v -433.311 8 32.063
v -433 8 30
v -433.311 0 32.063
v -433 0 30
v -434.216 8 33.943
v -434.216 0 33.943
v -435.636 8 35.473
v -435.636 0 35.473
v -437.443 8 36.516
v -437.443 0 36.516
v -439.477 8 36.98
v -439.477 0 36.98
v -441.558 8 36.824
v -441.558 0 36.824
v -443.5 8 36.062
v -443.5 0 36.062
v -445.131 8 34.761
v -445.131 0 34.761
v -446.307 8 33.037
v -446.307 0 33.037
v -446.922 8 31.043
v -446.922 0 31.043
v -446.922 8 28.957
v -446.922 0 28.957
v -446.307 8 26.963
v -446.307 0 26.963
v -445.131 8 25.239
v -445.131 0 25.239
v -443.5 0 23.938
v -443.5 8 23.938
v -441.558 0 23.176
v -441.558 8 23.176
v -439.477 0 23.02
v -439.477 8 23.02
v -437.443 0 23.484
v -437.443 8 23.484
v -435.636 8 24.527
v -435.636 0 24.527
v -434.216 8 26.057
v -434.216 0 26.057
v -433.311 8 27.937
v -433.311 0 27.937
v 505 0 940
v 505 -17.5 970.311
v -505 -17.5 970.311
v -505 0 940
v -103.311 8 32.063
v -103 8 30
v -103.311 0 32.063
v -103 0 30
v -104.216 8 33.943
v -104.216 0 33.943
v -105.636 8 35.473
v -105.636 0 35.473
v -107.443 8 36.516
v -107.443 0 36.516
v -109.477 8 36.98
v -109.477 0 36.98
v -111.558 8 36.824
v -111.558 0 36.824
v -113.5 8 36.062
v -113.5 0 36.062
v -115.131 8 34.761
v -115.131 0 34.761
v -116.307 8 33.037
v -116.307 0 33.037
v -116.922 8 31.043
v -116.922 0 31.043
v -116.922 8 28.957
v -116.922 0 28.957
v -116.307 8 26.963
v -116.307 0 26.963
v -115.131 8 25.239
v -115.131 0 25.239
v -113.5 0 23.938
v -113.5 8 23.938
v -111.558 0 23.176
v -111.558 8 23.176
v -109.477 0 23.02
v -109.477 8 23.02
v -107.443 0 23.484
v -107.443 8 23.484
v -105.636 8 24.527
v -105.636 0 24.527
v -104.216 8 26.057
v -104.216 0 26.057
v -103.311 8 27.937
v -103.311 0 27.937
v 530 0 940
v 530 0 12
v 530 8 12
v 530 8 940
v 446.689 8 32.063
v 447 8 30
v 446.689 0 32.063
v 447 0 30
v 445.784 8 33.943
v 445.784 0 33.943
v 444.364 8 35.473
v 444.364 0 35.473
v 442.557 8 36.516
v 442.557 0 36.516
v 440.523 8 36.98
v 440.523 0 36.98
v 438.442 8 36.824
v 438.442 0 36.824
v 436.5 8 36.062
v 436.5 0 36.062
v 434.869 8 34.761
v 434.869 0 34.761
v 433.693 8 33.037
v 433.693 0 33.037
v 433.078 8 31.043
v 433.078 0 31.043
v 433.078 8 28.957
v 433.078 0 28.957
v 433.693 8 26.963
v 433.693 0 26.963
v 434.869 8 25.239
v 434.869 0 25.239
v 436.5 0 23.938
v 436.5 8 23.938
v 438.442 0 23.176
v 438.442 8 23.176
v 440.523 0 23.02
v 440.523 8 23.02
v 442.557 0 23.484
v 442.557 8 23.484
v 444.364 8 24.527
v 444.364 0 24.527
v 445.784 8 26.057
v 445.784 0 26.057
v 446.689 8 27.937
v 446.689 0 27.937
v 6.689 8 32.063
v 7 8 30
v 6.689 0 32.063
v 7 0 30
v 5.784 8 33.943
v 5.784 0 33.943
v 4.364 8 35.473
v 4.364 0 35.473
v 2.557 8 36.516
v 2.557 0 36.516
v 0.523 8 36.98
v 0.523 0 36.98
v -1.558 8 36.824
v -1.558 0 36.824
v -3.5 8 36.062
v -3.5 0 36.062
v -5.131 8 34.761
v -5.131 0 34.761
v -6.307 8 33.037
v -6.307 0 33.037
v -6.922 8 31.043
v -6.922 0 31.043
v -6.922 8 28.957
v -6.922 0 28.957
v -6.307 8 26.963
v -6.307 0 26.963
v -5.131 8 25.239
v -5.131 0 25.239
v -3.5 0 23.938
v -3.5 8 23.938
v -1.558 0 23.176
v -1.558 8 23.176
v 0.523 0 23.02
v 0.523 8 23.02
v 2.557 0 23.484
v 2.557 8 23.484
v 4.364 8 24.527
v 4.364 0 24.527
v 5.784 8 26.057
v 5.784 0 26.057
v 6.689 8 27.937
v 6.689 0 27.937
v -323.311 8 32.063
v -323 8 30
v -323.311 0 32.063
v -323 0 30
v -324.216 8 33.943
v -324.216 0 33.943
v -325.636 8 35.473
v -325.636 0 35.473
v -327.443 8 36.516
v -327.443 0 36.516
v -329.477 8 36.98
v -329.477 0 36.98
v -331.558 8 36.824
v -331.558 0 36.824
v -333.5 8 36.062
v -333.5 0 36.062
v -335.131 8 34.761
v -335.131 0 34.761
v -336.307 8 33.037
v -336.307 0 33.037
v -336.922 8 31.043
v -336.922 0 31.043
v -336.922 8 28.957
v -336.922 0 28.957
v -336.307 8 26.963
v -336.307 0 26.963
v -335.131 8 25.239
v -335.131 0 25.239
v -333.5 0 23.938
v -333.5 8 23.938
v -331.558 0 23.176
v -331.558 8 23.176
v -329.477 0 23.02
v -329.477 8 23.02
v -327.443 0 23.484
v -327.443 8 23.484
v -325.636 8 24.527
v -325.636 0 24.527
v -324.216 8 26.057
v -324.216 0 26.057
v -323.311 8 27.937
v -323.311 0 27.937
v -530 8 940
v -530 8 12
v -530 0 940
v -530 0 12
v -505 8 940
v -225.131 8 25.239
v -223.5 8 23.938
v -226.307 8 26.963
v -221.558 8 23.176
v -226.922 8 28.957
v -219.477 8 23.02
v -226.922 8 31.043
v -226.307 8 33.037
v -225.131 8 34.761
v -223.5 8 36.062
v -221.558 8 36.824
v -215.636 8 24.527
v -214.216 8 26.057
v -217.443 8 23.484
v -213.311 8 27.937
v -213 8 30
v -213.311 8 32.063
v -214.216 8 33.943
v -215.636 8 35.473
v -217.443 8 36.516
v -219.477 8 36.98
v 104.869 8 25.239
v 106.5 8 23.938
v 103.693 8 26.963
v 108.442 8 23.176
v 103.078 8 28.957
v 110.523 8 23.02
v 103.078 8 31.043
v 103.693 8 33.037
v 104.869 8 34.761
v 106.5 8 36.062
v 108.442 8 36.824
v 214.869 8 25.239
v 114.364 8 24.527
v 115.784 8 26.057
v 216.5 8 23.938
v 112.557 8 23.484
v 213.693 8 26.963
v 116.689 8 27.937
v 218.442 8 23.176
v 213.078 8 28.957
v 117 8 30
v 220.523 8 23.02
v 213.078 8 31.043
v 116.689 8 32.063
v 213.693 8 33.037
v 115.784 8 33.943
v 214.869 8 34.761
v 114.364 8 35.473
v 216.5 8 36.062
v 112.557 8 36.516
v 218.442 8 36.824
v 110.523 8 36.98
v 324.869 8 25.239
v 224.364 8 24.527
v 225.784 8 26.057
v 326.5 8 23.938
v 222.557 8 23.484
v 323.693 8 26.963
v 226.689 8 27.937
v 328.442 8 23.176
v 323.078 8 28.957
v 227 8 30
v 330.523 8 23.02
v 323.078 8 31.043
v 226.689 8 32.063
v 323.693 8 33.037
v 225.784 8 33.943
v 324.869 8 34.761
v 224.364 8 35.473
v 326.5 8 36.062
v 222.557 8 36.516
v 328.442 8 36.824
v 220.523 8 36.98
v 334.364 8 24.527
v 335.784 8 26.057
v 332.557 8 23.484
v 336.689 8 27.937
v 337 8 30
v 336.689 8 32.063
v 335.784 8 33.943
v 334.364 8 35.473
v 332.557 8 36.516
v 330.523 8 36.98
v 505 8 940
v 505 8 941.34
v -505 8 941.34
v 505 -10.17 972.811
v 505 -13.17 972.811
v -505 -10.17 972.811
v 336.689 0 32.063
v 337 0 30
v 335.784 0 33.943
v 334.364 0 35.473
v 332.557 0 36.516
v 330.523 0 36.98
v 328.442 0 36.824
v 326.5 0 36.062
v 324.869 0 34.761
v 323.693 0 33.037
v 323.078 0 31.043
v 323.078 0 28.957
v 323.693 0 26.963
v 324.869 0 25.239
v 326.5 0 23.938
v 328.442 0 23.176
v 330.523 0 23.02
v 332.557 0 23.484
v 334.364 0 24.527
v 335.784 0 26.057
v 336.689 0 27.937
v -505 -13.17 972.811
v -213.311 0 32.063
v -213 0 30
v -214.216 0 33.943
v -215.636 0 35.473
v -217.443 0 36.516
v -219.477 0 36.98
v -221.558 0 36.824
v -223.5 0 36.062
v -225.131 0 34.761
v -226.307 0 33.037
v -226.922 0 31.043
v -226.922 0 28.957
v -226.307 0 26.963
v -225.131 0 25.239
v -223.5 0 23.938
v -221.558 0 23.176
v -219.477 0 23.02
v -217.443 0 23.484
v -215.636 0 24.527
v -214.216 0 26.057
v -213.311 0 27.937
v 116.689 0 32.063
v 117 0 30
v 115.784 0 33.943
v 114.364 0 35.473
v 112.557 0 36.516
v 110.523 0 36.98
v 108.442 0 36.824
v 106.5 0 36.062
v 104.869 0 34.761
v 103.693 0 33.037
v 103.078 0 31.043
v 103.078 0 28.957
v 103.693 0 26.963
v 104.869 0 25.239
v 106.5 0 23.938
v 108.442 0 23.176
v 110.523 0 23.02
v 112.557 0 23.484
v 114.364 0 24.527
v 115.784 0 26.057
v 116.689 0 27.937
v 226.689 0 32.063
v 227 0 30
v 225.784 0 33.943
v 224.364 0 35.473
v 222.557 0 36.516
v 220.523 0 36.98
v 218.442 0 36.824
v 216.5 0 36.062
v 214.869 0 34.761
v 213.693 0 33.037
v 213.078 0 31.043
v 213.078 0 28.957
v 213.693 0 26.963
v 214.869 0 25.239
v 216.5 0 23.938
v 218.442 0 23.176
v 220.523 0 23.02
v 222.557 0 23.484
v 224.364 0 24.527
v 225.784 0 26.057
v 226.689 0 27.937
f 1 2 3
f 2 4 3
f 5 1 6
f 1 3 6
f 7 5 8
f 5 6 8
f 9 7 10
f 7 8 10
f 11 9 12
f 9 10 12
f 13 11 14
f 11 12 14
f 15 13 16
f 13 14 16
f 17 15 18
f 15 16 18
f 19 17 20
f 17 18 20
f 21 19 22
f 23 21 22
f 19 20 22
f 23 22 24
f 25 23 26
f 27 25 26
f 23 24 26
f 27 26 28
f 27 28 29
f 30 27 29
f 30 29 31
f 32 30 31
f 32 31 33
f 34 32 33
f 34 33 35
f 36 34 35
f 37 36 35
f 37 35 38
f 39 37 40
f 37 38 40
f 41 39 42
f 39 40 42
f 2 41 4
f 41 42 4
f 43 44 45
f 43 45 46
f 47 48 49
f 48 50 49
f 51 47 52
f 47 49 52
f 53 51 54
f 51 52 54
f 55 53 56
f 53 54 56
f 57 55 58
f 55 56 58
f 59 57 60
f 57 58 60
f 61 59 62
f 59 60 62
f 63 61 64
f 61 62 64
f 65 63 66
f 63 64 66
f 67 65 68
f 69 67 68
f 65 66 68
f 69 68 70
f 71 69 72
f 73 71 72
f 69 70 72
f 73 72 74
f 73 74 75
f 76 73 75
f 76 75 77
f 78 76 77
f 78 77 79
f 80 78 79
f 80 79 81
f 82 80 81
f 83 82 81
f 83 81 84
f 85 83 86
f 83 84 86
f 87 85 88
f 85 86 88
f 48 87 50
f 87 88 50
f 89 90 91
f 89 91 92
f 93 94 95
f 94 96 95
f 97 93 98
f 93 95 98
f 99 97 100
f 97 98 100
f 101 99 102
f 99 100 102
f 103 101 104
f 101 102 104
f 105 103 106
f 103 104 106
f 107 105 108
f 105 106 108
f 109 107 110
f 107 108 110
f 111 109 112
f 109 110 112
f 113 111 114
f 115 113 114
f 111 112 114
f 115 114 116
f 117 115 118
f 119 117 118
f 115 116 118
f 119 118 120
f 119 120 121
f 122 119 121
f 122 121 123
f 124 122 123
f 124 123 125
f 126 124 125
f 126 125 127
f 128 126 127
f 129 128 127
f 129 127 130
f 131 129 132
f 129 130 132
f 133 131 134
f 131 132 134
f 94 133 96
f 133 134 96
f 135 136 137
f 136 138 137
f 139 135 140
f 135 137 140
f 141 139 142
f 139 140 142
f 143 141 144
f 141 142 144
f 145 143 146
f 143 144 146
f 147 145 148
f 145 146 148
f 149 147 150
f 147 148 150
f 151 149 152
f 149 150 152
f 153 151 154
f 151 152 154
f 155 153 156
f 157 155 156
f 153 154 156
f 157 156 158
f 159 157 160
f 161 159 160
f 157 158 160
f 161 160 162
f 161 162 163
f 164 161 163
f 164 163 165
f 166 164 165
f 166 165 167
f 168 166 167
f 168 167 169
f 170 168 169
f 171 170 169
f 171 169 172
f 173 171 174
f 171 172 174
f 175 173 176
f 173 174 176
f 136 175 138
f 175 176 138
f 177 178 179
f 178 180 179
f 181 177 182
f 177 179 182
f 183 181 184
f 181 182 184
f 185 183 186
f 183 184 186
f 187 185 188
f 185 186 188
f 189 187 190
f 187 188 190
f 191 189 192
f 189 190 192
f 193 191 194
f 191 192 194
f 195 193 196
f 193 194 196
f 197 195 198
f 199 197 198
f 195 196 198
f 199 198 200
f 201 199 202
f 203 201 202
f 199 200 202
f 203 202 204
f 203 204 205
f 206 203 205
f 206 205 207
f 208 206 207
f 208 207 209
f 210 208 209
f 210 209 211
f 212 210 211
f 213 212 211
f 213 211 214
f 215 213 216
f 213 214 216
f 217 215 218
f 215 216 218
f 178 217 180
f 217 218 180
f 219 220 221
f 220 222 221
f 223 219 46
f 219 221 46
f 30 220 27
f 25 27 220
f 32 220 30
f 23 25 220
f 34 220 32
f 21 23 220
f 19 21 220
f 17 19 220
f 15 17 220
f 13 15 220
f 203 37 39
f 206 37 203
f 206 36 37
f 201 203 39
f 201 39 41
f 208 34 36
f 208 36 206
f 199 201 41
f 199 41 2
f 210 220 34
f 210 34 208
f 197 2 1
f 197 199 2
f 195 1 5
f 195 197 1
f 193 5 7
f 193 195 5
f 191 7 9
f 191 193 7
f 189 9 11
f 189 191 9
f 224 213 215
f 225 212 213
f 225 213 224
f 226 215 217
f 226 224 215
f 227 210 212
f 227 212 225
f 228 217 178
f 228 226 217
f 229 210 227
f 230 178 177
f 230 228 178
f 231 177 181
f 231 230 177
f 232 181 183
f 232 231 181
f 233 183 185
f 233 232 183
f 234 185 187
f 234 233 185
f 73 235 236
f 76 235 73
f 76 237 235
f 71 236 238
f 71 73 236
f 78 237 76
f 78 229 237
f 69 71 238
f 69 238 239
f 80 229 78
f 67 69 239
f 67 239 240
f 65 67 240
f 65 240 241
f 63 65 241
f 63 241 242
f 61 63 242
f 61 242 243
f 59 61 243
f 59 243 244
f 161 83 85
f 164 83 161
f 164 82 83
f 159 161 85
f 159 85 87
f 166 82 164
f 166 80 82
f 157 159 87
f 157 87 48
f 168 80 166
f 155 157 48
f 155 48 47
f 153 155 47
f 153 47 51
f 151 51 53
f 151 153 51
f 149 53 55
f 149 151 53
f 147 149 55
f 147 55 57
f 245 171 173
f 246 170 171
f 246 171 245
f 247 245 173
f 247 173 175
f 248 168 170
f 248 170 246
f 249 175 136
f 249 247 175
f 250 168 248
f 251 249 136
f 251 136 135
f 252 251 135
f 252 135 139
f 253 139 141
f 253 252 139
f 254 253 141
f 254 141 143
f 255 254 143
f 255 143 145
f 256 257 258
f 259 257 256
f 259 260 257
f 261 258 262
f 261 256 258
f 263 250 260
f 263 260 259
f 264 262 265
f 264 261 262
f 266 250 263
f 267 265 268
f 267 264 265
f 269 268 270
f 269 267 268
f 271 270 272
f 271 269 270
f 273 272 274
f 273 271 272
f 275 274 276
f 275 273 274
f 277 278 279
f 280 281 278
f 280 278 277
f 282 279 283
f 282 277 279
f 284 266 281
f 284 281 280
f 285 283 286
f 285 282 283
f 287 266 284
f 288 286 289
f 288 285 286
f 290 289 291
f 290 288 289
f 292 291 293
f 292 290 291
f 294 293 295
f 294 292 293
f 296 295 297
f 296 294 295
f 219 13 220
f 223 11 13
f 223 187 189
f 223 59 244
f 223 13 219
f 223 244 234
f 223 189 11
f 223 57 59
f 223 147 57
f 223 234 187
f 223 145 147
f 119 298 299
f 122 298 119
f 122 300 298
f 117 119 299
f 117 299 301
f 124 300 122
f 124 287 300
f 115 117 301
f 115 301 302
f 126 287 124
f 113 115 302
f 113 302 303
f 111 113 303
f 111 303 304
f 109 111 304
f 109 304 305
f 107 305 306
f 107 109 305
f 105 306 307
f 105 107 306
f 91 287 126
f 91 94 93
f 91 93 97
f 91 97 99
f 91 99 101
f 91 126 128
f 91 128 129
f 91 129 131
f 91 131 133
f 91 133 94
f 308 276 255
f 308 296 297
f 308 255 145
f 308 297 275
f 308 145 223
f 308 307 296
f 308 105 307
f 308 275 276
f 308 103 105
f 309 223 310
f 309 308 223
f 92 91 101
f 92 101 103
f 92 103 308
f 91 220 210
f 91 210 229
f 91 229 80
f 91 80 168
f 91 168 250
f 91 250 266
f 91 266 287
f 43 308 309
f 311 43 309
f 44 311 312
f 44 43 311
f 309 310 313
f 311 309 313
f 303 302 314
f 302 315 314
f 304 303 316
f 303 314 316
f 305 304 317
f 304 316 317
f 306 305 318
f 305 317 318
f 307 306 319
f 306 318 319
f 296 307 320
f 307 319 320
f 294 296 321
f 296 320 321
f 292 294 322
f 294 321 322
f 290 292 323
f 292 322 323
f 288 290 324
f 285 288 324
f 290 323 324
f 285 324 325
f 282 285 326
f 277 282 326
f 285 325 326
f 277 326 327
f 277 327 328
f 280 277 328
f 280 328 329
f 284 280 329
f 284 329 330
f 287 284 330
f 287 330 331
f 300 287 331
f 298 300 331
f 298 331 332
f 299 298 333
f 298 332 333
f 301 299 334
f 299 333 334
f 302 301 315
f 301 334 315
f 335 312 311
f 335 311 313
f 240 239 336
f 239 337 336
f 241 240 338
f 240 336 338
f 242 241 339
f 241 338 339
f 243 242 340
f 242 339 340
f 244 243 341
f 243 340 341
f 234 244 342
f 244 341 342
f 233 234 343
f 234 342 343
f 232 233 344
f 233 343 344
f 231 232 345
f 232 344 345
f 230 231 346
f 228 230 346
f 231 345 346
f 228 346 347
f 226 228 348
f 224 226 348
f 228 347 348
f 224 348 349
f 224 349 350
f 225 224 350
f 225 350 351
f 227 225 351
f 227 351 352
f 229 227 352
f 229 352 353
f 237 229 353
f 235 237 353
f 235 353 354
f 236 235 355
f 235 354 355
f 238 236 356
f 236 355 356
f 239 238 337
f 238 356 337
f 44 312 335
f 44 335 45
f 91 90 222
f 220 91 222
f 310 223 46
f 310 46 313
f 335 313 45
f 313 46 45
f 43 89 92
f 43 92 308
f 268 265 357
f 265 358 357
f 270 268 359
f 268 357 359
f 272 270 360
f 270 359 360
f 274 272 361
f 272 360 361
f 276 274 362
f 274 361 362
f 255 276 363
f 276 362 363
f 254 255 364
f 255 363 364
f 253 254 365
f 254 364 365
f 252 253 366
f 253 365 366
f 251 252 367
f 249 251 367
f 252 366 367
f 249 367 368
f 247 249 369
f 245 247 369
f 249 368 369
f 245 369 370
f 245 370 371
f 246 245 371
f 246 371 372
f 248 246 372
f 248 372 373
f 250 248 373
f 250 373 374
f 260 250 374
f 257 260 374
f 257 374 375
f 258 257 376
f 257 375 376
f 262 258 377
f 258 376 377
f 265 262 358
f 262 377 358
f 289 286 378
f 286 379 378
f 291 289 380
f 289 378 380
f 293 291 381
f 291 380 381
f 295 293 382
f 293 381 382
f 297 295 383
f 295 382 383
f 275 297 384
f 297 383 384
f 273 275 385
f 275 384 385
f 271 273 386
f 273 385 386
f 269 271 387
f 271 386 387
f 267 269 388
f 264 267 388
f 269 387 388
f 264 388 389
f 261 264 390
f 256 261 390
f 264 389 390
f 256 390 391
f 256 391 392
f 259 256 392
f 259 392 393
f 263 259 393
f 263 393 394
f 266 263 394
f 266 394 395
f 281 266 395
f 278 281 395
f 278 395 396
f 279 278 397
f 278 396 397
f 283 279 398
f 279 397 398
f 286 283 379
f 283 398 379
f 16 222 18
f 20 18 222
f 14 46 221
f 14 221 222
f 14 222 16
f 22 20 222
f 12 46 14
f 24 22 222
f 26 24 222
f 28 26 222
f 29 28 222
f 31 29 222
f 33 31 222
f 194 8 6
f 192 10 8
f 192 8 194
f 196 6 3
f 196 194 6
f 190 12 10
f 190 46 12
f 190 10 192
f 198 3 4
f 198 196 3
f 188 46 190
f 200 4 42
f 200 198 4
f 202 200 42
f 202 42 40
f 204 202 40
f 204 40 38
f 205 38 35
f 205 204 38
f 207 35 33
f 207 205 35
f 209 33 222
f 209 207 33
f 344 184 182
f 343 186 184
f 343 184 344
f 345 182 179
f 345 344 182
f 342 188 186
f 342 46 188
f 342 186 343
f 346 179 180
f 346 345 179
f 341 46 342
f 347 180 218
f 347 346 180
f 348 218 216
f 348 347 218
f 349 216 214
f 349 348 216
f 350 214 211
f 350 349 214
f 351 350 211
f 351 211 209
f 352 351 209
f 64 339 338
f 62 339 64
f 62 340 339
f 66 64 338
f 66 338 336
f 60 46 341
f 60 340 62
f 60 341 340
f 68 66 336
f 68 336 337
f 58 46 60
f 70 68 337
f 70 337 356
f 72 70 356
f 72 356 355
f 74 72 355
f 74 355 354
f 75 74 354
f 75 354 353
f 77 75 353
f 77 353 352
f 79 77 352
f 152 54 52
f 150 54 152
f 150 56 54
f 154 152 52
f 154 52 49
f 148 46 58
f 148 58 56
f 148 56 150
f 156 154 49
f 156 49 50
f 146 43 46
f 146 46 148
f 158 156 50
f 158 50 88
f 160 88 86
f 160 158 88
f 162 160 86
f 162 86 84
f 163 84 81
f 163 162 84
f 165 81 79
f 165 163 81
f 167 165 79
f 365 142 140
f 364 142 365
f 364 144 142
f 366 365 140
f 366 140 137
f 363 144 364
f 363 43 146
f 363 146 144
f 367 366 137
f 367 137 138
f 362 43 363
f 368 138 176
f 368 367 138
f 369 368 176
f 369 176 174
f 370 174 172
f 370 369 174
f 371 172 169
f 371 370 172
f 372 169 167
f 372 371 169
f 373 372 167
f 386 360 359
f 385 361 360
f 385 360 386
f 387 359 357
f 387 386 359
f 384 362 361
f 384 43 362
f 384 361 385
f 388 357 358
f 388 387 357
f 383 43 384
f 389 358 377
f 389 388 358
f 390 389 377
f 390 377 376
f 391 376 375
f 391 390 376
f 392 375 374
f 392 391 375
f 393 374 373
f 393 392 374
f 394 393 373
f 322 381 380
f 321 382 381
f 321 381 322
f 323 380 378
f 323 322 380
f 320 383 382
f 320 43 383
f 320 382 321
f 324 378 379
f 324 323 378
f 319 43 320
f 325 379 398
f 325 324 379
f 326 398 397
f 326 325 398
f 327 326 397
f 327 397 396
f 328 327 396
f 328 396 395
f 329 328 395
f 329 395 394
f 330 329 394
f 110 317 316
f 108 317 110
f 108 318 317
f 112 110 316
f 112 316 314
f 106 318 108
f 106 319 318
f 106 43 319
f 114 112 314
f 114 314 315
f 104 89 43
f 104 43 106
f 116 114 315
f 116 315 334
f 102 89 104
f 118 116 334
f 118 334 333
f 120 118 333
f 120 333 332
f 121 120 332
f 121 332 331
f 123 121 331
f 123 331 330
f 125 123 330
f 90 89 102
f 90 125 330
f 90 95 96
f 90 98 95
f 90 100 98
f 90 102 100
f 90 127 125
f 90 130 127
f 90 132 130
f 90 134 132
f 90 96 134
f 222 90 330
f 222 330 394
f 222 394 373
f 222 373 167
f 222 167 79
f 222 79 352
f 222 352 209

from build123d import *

# Parameters (mm, degrees)
F1_DEPTH = 530
F3_DEPTH = 25
F4_R     = 7
F5_DEPTH = 5.001
F7_DEPTH = 1060.001
F8_DEPTH = 3


# Not quite as in the source:
# - a pattern or mirror of a feature is missing from the dataset's text; its kind, count and spacing are read off the source's solid


with BuildPart() as f1:
    # F0 (on Right) → F1 (new body, symmetric)
    with BuildSketch(Plane.YZ):
        Polygon((0, 940), (0, 0), (-6.4704761276, -24.1481456572), (-1.6408469961, -25.4422408827), (5, -0.6582624879), (5, 941.3397459622), (-13.1698729811, 972.8108891325), (-17.5, 970.3108891325), align=None)
    extrude(amount=F1_DEPTH, both=True)

    # F2 (on face) → F3 (cut)
    with BuildSketch(Plane.YZ.offset(530)):
        Polygon((5, 0), (0, 0), (-6.4704761276, -24.1481456572), (-1.6408469961, -25.4422408827), (5, -0.6582624879), align=None)
        Polygon((-17.5, 970.3108891325), (0, 940), (5, 940), (5, 941.3397459622), (-13.1698729811, 972.8108891325), align=None)
    f3 = extrude(amount=-F3_DEPTH, mode=Mode.SUBTRACT)

    # F3_copies: F3 across plane
    add(f3.mirror(Plane(origin=(0, 0, 0), x_dir=(0, 0, -1), z_dir=(-1, 0, 0))), mode=Mode.SUBTRACT)

    # F4 (on face) → F5 (cut, through all)
    with BuildSketch(Plane.XZ):
        with Locations((0, 30)):
            Circle(F4_R)
        with Locations((110, 30)):
            Circle(F4_R)
        with Locations((220, 30)):
            Circle(F4_R)
        with Locations((330, 30)):
            Circle(F4_R)
        with Locations((440, 30)):
            Circle(F4_R)
        with Locations((-110, 30)):
            Circle(F4_R)
        with Locations((-220, 30)):
            Circle(F4_R)
        with Locations((-330, 30)):
            Circle(F4_R)
        with Locations((-440, 30)):
            Circle(F4_R)
    extrude(amount=-F5_DEPTH, mode=Mode.SUBTRACT)

    # F6 (on face) → F7 (cut, through all)
    with BuildSketch(Plane.YZ.offset(530)):
        Polygon((0, 12), (0, 0), (-6.4704761276, -24.1481456572), (-1.6408469961, -25.4422408827), (5, -0.6582624879), (5, 12), align=None)
    extrude(amount=-F7_DEPTH, mode=Mode.SUBTRACT)

    # F8 (add): faces of the model
    f8_faces = [f1.faces().sort_by_distance(p)[0] for p in [
        (0, 5, 477.2673971314),
        (0, -4.0849364905, 957.0753175473),
    ]]
    extrude(f8_faces, amount=F8_DEPTH, dir=(0, 1, 0))


solid = f1.part
